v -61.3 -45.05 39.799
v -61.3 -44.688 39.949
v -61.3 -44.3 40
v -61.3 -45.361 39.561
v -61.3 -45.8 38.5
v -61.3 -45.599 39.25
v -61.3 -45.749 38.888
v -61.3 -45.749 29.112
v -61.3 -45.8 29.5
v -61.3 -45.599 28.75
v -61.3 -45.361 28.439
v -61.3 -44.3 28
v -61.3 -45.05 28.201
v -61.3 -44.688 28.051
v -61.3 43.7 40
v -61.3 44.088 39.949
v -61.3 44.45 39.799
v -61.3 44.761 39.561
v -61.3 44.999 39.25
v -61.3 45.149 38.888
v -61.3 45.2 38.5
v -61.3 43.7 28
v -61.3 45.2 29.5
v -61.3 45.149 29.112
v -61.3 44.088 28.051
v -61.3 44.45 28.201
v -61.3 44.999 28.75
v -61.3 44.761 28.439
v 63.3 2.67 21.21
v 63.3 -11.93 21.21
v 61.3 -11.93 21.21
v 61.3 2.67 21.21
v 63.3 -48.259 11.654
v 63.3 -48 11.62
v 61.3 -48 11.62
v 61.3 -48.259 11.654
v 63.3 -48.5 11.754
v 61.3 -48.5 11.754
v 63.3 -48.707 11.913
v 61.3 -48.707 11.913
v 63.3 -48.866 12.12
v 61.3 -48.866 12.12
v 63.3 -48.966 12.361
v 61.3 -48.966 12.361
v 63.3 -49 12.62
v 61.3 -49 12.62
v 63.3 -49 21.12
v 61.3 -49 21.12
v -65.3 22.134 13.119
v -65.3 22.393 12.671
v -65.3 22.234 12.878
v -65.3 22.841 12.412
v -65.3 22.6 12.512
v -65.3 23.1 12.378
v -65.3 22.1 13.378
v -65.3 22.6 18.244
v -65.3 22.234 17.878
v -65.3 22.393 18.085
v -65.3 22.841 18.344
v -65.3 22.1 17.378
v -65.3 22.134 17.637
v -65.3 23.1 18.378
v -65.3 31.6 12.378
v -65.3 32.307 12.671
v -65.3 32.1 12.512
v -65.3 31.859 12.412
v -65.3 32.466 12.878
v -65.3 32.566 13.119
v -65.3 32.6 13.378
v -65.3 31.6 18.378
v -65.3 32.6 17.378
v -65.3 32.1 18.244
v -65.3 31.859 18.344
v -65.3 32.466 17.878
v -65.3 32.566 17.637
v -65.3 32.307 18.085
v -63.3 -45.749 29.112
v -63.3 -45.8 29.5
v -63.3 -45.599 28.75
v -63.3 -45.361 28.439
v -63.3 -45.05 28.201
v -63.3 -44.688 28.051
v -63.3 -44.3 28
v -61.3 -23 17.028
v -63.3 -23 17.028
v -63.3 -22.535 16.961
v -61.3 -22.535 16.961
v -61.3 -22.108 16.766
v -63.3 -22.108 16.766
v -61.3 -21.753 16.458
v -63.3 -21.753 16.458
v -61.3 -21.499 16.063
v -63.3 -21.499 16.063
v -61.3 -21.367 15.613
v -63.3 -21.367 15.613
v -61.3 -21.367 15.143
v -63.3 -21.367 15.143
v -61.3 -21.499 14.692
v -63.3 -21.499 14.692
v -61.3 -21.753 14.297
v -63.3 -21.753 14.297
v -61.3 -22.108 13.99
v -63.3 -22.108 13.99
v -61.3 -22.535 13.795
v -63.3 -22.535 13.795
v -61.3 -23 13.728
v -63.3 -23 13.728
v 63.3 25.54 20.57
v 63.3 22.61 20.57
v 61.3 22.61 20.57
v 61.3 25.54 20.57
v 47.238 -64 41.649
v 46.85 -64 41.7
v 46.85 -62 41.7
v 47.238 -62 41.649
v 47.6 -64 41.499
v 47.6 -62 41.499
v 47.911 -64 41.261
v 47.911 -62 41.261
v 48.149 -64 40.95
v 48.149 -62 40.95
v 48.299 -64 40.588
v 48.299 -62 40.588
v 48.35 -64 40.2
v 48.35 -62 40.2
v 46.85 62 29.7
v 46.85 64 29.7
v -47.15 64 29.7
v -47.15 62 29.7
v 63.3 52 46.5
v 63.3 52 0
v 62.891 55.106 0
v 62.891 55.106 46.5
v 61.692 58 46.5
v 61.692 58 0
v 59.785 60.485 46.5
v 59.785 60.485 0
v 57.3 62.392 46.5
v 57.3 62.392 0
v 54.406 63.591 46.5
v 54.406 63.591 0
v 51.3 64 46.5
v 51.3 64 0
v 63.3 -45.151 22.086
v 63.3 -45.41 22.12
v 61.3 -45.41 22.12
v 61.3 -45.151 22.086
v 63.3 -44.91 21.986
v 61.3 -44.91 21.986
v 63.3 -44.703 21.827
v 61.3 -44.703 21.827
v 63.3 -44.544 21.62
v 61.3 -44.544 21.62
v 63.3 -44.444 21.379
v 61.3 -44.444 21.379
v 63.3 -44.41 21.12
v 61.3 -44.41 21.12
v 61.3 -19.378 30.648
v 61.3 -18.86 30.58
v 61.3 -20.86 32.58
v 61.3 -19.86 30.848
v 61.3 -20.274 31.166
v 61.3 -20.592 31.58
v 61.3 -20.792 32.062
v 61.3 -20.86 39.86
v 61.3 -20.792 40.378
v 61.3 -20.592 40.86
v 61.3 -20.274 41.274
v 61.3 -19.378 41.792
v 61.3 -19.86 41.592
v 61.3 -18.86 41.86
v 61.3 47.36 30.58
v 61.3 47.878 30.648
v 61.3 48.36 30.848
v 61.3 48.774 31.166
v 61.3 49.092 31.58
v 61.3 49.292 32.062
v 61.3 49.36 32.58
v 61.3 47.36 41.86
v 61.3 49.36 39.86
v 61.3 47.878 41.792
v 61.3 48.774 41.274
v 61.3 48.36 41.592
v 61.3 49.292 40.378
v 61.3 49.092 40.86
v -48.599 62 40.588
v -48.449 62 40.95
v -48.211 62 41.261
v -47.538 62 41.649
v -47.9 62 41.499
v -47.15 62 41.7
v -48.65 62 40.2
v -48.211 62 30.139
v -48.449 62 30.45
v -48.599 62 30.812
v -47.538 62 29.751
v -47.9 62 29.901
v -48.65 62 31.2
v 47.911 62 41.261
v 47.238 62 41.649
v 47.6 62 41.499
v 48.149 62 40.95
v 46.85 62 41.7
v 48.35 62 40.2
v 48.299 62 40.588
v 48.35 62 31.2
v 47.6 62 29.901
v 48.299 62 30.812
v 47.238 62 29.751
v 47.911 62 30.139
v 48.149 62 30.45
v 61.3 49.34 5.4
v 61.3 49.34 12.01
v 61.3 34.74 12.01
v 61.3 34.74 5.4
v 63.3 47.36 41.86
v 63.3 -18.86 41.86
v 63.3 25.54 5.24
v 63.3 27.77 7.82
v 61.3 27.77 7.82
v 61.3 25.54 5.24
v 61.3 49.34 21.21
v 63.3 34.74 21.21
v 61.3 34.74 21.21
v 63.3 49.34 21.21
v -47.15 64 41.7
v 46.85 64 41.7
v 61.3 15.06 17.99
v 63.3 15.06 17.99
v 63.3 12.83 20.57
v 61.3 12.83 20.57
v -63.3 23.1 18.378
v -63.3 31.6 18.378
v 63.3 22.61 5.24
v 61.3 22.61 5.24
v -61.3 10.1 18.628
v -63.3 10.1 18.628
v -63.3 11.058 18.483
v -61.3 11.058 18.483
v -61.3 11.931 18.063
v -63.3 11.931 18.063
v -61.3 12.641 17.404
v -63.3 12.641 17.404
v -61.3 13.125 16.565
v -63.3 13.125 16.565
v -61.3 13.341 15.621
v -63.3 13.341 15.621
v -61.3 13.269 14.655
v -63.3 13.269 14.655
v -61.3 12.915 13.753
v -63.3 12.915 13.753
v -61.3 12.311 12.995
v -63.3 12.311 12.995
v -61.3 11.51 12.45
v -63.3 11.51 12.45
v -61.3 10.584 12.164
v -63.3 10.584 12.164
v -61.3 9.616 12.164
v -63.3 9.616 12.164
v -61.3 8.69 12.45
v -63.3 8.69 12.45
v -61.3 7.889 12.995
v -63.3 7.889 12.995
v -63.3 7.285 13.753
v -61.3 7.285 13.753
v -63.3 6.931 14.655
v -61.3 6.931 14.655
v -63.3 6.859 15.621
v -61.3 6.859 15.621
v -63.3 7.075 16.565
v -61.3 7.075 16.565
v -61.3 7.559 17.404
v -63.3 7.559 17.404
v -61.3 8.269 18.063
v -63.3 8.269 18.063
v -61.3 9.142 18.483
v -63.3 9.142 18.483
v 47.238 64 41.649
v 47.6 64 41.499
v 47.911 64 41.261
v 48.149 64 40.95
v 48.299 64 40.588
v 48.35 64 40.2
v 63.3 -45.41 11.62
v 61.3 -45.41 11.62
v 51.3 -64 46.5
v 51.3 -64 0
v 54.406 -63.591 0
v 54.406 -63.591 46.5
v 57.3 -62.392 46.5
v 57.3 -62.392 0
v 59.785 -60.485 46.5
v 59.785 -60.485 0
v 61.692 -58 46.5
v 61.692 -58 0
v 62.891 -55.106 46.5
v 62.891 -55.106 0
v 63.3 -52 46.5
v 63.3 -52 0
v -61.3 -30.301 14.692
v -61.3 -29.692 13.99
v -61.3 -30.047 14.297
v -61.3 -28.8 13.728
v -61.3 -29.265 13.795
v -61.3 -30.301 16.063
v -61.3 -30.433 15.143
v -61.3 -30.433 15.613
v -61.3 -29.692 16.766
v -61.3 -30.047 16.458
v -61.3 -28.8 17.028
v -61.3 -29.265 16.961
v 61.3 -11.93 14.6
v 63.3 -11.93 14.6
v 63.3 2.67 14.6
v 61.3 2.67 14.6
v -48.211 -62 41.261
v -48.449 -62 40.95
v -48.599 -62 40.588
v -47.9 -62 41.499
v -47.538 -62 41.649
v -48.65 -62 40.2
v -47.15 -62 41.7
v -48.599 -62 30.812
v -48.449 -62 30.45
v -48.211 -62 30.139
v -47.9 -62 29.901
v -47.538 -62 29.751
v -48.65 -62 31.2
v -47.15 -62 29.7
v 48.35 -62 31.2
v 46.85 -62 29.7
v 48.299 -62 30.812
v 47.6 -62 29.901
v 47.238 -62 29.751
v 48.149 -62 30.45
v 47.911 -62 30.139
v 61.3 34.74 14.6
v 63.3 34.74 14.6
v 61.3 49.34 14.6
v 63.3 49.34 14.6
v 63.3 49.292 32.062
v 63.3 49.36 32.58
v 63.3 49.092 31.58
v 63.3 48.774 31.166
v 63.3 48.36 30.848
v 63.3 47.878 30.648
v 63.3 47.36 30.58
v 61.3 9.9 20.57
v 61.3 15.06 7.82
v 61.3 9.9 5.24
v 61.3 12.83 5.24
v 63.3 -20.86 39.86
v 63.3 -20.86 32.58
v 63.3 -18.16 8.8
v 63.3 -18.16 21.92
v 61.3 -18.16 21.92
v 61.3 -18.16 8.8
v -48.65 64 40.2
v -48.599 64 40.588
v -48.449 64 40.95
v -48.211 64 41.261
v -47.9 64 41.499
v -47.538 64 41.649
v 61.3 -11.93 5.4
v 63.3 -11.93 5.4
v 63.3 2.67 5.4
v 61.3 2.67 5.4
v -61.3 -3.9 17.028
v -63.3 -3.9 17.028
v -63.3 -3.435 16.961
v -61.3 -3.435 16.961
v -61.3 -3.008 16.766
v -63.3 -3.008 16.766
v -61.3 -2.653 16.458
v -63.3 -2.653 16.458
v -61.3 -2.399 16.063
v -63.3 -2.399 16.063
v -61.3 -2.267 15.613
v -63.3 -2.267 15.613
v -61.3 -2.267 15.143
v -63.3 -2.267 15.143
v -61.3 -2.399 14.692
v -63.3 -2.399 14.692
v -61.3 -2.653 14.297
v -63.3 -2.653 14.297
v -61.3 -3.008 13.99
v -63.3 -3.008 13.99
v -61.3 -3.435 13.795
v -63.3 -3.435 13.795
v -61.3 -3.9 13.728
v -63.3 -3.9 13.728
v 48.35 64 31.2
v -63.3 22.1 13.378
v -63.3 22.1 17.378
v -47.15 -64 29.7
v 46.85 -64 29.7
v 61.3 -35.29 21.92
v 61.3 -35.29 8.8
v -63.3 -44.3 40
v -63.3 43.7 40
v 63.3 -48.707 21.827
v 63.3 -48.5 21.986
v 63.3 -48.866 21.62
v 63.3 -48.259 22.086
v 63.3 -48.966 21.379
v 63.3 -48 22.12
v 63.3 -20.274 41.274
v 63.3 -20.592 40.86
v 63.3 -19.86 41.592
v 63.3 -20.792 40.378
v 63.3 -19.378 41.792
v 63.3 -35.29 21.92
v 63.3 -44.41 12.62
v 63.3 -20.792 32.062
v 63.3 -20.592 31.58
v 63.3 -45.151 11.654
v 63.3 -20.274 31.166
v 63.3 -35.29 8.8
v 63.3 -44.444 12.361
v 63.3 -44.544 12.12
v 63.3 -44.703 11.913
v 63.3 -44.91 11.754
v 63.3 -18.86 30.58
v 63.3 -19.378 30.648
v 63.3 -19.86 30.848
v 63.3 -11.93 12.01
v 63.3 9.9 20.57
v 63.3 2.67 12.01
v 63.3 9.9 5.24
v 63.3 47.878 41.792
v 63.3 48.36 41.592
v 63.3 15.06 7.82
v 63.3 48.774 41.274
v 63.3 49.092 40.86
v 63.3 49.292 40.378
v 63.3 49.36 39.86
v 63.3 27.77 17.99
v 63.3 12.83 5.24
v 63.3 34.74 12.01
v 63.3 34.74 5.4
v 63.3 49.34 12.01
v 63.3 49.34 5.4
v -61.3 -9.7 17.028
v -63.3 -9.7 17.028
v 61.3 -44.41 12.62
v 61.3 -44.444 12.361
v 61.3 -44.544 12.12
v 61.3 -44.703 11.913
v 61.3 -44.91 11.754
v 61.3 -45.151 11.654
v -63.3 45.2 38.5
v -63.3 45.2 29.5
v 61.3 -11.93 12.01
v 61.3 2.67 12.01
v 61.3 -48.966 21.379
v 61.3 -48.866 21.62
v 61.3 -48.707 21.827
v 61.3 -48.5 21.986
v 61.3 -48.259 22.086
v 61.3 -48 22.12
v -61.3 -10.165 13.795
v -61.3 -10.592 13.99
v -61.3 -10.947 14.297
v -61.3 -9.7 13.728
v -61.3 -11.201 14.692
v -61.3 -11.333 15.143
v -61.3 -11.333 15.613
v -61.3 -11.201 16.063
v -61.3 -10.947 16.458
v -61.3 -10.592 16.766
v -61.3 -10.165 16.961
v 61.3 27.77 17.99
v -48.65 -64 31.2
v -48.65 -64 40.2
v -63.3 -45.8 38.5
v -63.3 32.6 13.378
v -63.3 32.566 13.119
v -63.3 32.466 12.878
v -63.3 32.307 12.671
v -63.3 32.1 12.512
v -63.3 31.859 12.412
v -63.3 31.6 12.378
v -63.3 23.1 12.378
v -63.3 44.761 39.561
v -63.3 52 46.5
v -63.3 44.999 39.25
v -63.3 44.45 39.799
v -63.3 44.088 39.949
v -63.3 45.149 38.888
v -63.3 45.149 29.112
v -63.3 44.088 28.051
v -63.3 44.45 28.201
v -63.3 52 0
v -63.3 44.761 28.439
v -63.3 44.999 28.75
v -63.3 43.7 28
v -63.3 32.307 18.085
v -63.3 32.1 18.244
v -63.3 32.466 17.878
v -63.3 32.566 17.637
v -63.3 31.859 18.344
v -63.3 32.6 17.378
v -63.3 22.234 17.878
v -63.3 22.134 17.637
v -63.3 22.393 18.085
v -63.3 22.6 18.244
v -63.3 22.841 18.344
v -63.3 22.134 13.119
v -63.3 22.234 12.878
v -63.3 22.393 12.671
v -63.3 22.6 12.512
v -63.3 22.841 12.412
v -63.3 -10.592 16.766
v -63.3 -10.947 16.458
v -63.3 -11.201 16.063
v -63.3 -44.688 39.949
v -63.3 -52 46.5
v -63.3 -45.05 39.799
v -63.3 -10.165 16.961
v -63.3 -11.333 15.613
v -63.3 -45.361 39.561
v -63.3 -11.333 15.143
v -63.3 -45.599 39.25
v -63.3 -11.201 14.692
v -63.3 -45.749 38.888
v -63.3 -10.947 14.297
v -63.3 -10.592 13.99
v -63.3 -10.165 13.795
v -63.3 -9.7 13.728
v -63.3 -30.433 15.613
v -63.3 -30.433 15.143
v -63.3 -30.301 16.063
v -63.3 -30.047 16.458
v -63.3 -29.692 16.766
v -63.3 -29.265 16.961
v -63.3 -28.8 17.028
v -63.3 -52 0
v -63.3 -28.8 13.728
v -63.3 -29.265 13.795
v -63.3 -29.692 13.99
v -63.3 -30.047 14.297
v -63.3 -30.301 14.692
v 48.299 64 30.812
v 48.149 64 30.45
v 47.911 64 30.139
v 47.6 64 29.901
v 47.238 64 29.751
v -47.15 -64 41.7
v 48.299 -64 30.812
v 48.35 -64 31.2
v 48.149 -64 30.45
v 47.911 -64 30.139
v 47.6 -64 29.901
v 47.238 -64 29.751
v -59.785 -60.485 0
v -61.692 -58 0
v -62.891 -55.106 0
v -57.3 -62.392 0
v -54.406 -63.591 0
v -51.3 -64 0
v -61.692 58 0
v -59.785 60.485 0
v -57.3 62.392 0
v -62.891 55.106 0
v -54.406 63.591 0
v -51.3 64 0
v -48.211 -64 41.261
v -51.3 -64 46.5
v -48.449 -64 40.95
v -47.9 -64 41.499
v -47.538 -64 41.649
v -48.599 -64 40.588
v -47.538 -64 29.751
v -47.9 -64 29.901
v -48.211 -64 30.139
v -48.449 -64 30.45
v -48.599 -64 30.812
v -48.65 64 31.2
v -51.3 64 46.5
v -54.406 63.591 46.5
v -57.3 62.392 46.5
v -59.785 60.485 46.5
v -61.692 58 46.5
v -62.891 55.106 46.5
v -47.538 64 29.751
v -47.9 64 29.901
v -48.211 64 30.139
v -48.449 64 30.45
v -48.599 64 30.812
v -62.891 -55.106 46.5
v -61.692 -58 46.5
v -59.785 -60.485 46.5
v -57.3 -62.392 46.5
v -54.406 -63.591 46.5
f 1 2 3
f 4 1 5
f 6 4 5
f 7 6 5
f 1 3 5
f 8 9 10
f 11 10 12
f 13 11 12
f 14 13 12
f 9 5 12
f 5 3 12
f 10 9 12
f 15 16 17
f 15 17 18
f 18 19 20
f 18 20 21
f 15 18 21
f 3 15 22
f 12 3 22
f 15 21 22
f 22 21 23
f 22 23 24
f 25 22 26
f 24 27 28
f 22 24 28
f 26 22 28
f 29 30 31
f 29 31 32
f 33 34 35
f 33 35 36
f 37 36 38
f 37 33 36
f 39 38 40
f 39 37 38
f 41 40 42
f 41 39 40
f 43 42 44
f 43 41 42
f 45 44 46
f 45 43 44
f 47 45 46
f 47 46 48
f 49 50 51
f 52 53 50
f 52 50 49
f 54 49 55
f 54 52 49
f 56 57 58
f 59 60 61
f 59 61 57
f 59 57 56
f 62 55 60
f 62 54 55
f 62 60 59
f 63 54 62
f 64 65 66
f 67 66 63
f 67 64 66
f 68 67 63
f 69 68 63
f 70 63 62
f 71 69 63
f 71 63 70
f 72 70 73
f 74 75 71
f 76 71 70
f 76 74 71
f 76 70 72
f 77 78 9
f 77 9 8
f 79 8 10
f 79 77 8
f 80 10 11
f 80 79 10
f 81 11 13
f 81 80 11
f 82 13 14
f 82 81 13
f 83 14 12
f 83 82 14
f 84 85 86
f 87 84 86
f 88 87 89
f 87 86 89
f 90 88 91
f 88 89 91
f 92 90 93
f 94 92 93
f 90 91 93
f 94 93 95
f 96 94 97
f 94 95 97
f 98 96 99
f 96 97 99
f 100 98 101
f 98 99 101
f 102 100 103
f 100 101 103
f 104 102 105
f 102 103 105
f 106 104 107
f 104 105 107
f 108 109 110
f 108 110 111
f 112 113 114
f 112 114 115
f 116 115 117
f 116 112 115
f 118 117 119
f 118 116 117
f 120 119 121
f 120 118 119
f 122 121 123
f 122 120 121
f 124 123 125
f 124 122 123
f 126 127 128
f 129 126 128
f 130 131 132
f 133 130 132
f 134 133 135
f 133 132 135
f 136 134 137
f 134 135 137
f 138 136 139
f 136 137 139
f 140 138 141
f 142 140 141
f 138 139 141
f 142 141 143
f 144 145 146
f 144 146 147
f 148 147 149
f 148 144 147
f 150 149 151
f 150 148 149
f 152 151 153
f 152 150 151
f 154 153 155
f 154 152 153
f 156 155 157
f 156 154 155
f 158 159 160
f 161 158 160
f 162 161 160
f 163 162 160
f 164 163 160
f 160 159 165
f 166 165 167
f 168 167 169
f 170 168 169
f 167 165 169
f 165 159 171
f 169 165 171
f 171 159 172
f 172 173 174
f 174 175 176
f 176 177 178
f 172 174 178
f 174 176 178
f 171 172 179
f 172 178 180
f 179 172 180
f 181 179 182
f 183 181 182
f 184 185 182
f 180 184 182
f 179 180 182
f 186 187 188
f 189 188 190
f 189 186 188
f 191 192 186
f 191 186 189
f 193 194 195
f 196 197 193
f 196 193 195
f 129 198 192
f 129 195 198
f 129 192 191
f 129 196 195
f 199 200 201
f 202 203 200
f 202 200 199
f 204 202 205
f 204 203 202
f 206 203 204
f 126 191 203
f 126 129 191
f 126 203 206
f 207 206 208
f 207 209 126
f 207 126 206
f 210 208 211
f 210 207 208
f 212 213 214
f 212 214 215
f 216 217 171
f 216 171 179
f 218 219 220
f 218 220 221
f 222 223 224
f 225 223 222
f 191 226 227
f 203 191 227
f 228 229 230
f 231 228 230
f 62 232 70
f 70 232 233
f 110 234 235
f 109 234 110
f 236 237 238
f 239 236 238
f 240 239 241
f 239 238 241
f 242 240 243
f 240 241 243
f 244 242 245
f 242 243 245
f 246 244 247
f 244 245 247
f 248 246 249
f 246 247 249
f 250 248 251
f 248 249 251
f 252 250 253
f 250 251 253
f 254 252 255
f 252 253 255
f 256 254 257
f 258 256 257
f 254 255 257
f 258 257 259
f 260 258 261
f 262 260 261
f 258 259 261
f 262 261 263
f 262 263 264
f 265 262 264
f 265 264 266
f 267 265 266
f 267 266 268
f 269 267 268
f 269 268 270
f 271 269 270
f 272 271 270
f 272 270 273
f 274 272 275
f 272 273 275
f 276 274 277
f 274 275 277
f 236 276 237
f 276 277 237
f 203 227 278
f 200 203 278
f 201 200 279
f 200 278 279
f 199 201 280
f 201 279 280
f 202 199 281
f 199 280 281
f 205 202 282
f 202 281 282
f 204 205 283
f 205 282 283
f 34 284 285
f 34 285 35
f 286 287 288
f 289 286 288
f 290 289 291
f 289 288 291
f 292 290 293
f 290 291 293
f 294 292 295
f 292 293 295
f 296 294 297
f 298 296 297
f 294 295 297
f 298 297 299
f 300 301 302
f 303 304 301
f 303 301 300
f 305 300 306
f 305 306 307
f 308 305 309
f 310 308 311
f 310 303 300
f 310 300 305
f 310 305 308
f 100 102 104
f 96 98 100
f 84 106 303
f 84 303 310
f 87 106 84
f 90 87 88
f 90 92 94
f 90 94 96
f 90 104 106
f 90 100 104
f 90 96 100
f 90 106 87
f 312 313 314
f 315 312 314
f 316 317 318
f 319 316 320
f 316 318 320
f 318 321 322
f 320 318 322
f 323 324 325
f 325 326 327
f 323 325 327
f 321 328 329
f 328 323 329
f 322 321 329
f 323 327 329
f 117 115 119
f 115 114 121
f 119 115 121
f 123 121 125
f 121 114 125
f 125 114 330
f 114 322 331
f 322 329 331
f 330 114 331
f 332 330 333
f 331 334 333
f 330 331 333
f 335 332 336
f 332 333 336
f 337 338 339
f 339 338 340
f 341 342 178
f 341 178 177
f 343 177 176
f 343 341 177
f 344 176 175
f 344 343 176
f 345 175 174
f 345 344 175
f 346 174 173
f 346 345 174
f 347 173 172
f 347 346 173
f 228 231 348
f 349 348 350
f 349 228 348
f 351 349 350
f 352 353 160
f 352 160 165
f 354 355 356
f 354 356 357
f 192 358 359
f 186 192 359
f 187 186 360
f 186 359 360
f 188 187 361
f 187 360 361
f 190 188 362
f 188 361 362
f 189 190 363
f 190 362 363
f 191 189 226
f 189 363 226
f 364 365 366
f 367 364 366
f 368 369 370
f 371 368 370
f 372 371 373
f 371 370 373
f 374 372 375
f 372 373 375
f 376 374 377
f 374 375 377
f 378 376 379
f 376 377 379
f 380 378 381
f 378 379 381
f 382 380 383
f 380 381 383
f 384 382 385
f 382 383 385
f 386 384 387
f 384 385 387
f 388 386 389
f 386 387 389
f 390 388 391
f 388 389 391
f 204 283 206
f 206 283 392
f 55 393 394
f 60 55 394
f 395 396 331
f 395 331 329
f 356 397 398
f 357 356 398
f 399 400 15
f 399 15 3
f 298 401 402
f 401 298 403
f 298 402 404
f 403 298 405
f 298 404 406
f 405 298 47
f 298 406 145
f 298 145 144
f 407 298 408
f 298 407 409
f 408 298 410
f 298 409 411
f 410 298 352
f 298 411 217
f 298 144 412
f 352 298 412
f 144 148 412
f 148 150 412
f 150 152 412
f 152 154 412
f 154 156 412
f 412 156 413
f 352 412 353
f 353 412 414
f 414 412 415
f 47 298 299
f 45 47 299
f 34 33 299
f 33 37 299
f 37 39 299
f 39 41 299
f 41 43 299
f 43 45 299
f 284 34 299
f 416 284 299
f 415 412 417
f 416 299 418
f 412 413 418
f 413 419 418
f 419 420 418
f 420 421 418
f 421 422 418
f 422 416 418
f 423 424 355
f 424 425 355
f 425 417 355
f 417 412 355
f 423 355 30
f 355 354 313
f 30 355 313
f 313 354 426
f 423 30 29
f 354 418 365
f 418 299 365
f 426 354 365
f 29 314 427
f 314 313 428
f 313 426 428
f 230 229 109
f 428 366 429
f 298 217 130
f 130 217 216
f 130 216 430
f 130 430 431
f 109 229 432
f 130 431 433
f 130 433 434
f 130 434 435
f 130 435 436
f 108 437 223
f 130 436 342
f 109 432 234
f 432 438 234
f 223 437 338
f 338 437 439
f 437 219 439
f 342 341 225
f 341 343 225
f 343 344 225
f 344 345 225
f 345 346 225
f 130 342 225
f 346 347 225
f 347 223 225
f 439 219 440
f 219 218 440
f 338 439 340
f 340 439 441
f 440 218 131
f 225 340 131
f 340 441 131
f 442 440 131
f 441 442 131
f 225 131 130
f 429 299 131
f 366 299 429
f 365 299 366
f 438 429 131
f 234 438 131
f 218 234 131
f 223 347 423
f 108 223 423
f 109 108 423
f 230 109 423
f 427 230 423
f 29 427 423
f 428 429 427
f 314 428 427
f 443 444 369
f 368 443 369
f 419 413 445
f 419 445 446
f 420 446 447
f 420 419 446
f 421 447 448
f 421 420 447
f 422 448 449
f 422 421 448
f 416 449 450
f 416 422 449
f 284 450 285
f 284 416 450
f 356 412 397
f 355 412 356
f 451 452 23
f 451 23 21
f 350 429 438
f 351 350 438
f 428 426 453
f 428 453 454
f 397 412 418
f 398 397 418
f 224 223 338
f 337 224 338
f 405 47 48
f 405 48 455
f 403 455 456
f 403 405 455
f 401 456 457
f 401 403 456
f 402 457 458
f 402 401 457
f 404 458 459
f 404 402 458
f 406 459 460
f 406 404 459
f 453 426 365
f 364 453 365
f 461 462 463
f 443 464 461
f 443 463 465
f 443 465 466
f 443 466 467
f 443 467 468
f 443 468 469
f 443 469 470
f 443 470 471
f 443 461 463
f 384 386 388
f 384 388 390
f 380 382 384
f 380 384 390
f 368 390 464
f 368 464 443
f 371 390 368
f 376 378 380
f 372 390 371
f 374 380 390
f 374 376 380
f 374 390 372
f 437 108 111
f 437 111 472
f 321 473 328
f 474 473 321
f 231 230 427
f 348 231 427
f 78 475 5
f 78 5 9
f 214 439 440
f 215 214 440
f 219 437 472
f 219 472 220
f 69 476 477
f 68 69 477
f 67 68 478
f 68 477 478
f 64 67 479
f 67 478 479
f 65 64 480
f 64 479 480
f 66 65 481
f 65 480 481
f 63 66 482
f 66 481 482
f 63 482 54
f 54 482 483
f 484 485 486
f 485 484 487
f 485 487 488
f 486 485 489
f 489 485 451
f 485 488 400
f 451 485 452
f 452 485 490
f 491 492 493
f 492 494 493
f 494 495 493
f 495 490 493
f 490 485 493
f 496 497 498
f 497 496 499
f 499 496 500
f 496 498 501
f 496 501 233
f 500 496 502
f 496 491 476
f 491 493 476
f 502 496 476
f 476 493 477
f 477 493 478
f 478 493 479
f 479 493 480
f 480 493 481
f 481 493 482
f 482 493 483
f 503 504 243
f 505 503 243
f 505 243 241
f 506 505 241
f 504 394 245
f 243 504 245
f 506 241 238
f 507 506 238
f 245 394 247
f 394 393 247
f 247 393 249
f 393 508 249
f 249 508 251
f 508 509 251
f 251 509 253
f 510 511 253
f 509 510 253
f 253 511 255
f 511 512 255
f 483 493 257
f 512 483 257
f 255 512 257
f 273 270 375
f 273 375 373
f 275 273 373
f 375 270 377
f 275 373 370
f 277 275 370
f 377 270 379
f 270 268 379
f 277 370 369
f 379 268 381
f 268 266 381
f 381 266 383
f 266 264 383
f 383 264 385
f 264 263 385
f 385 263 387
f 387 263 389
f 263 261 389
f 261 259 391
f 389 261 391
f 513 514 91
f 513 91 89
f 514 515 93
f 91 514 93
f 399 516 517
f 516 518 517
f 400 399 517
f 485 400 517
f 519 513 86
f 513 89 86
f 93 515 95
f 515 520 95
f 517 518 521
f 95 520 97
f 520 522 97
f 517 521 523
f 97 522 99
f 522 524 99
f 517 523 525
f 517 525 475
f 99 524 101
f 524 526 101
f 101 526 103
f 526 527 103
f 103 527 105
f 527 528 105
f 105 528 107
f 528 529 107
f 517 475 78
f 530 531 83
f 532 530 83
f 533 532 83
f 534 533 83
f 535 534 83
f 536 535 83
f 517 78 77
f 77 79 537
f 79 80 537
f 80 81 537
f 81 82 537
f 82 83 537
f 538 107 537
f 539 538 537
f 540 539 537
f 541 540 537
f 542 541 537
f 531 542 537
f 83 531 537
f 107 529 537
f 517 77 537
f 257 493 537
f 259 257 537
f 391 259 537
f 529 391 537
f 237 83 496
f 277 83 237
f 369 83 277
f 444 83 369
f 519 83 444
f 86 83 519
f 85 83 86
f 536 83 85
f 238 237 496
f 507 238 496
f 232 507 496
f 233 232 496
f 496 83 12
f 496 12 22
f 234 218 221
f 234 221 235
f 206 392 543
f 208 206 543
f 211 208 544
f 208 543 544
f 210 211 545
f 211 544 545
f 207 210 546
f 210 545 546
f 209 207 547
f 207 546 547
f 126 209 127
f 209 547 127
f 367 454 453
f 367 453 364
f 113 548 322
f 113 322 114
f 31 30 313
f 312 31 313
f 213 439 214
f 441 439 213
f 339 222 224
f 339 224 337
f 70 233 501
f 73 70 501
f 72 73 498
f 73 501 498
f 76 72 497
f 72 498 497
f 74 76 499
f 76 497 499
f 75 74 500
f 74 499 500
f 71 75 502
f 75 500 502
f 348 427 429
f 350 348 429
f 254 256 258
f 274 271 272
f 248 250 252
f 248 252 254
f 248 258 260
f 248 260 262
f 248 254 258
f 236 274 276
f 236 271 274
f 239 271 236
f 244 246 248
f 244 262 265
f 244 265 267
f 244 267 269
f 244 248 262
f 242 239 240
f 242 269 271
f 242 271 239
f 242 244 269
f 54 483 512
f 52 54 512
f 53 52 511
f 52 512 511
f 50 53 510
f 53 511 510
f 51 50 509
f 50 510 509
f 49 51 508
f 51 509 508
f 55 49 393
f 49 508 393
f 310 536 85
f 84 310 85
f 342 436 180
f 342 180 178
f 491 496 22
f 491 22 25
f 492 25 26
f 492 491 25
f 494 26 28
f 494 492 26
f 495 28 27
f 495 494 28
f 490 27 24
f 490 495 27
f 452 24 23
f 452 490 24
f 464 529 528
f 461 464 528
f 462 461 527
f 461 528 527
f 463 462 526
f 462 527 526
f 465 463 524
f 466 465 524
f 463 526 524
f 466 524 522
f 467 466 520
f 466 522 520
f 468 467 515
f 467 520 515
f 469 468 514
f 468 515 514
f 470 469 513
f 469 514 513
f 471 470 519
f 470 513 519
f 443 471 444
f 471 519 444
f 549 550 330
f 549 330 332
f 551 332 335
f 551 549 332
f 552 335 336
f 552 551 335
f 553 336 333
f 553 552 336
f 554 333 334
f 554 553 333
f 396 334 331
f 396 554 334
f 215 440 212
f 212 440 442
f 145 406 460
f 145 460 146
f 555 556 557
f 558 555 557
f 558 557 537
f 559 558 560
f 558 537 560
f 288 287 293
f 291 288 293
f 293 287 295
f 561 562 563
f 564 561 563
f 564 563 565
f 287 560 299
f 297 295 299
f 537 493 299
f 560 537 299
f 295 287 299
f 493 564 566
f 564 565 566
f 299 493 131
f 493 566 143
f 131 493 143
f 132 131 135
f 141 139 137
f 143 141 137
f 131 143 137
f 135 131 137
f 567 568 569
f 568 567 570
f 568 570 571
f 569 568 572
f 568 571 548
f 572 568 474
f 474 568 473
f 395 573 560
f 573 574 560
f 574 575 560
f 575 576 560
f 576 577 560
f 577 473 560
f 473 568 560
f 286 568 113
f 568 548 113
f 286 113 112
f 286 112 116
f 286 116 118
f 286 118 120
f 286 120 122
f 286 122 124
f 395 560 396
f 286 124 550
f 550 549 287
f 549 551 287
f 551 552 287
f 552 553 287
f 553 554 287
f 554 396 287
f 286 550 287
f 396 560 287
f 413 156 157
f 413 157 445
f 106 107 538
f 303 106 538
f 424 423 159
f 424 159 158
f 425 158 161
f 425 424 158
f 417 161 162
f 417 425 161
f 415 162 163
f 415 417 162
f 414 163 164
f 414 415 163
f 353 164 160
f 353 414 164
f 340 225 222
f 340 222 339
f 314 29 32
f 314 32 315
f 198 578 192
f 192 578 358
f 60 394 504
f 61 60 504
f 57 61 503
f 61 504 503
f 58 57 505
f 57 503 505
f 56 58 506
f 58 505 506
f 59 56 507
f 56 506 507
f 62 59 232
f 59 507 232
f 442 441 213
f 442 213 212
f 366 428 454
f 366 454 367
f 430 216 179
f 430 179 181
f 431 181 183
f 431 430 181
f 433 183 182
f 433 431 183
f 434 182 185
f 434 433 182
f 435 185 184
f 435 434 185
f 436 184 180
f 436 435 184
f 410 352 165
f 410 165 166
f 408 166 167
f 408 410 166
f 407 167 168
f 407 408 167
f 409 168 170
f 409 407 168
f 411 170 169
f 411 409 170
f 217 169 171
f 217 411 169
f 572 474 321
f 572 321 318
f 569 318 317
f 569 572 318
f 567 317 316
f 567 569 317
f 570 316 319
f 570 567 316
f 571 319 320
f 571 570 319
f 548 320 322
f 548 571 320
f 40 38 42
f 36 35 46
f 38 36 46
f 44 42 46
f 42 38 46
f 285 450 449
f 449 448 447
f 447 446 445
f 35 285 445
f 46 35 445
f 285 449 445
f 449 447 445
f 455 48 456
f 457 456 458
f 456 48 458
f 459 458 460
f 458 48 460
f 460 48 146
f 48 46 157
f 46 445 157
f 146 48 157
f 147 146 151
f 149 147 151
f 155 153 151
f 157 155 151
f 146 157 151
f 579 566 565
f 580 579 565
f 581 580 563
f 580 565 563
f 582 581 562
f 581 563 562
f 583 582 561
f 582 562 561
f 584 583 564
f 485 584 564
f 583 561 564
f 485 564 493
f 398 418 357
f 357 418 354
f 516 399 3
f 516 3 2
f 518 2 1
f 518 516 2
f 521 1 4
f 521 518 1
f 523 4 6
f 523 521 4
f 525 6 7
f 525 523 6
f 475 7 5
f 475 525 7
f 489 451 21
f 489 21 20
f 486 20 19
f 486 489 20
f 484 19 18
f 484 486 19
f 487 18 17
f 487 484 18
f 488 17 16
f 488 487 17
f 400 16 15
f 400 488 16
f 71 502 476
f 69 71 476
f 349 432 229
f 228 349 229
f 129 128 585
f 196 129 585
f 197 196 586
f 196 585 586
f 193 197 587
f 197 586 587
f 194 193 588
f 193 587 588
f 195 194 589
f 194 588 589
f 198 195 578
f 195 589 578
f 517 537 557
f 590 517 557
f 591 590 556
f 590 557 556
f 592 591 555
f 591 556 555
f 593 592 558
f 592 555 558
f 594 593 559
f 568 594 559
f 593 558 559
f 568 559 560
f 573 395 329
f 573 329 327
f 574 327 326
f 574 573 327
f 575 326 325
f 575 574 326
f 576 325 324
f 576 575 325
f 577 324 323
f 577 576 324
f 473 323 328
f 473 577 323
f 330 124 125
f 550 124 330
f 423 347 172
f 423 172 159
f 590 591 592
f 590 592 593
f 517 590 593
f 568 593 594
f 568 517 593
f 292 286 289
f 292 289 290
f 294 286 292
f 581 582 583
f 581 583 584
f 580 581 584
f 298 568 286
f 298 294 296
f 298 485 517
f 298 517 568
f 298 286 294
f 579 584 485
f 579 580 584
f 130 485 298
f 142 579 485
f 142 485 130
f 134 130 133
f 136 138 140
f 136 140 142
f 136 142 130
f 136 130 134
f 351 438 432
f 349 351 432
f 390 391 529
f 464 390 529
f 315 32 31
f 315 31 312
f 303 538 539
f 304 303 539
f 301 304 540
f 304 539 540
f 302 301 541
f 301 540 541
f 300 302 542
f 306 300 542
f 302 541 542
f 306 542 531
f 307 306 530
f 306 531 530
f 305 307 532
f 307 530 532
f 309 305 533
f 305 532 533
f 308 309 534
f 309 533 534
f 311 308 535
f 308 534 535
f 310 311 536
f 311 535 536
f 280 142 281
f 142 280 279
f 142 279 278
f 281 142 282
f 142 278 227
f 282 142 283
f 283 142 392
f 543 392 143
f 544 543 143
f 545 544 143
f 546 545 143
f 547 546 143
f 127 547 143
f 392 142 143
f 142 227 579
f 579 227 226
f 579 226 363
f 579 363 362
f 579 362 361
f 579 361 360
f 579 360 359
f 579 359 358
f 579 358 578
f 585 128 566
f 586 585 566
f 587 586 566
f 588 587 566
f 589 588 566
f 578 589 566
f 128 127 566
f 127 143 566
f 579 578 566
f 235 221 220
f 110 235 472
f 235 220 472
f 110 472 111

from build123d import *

# Parameters (mm, degrees)
DODANIE_WYCI_GNI_CIE1_DEPTH = 46.5
WYTNIJ_WYCI_GNI_CIE1_DEPTH  = 2
SZKIC3_R                    = 3.25
WYTNIJ_WYCI_GNI_CIE2_DEPTH  = 2
DODANIE_WYCI_GNI_CIE2_DEPTH = 2
SZKIC5_W                    = 6.61
SZKIC5_H                    = 14.6
SZKIC5_W_2                  = 13.12
SZKIC5_H_2                  = 17.13
WYTNIJ_WYCI_GNI_CIE3_DEPTH  = 2


with BuildPart() as part:
    # Szkic1 → Dodanie-wyciągnięcie1 (new body)
    with BuildSketch(Plane.XY):
        with BuildLine():
            Line((-51.3, -64), (51.3, -64))
            ThreePointArc((51.3, -64), (59.785281374, -60.485281374), (63.3, -52))
            Line((63.3, -52), (63.3, 52))
            ThreePointArc((63.3, 52), (59.785281374, 60.485281374), (51.3, 64))
            Line((51.3, 64), (-51.3, 64))
            ThreePointArc((-51.3, 64), (-59.785281374, 60.485281374), (-63.3, 52))
            Line((-63.3, 52), (-63.3, -52))
            ThreePointArc((-63.3, -52), (-59.785281374, -60.485281374), (-51.3, -64))
        make_face()
    extrude(amount=DODANIE_WYCI_GNI_CIE1_DEPTH)

    # Szkic2 → Wytnij-wyciągnięcie1 (cut)
    with BuildSketch(Plane(origin=(0, 64, 0), x_dir=(1, 0, 0), z_dir=(0, 1, 0))):
        with BuildLine():
            Line((-48.65, -31.2), (-48.65, -40.2))
            ThreePointArc((-48.65, -40.2), (-48.210660172, -41.260660172), (-47.15, -41.7))
            Line((-47.15, -41.7), (46.85, -41.7))
            ThreePointArc((46.85, -41.7), (47.910660172, -41.260660172), (48.35, -40.2))
            Line((48.35, -40.2), (48.35, -31.2))
            ThreePointArc((48.35, -31.2), (47.910660172, -30.139339828), (46.85, -29.7))
            Line((46.85, -29.7), (-47.15, -29.7))
            ThreePointArc((-47.15, -29.7), (-48.210660172, -30.139339828), (-48.65, -31.2))
        make_face()
    wytnij_wyci_gni_cie1 = extrude(amount=-WYTNIJ_WYCI_GNI_CIE1_DEPTH, mode=Mode.SUBTRACT)

    # Szkic3 → Wytnij-wyciągnięcie2 (cut)
    with BuildSketch(Plane.ZY.offset(63.3)):
        with BuildLine():
            ThreePointArc((28, -44.3), (28.439339828, -45.360660172), (29.5, -45.8))
            Line((29.5, -45.8), (38.5, -45.8))
            ThreePointArc((38.5, -45.8), (39.560660172, -45.360660172), (40, -44.3))
            Line((40, -44.3), (40, 43.7))
            ThreePointArc((40, 43.7), (39.560660172, 44.760660172), (38.5, 45.2))
            Line((38.5, 45.2), (29.5, 45.2))
            ThreePointArc((29.5, 45.2), (28.439339828, 44.760660172), (28, 43.7))
            Line((28, 43.7), (28, -44.3))
        make_face()
        with BuildLine():
            Line((17.02769909, -28.8), (17.02769909, -23))
            ThreePointArc((17.02769909, -23), (15.37769909, -21.35), (13.72769909, -23))
            Line((13.72769909, -23), (13.72769909, -28.8))
            ThreePointArc((13.72769909, -28.8), (15.37769909, -30.45), (17.02769909, -28.8))
        make_face()
        with BuildLine():
            Line((17.02769909, -9.7), (17.02769909, -3.9))
            ThreePointArc((17.02769909, -3.9), (15.37769909, -2.25), (13.72769909, -3.9))
            Line((13.72769909, -3.9), (13.72769909, -9.7))
            ThreePointArc((13.72769909, -9.7), (15.37769909, -11.35), (17.02769909, -9.7))
        make_face()
        with Locations((15.37769909, 10.1)):
            Circle(SZKIC3_R)
    extrude(amount=-WYTNIJ_WYCI_GNI_CIE2_DEPTH, mode=Mode.SUBTRACT)

    # Szkic3<3> → Dodanie-wyciągnięcie2 (add)
    with BuildSketch(Plane.ZY.offset(63.3)):
        with BuildLine():
            Line((17.37769909, 32.6), (13.37769909, 32.6))
            ThreePointArc((13.37769909, 32.6), (12.670592309, 32.307106781), (12.37769909, 31.6))
            Line((12.37769909, 31.6), (12.37769909, 23.1))
            ThreePointArc((12.37769909, 23.1), (12.670592309, 22.392893219), (13.37769909, 22.1))
            Line((13.37769909, 22.1), (17.37769909, 22.1))
            ThreePointArc((17.37769909, 22.1), (18.084805871, 22.392893219), (18.37769909, 23.1))
            Line((18.37769909, 23.1), (18.37769909, 31.6))
            ThreePointArc((18.37769909, 31.6), (18.084805871, 32.307106781), (17.37769909, 32.6))
        make_face()
    extrude(amount=DODANIE_WYCI_GNI_CIE2_DEPTH)

    # Lustro1: Wytnij-wyciągnięcie1 across plane
    add(wytnij_wyci_gni_cie1.mirror(Plane.ZX), mode=Mode.SUBTRACT)

    # Szkic5 → Wytnij-wyciągnięcie3 (cut)
    with BuildSketch(Plane(origin=(63.3, 0, 0), x_dir=(0, 0, -1), z_dir=(1, 0, 0))):
        with BuildLine():
            Line((-39.86, 49.36), (-32.58, 49.36))
            ThreePointArc((-32.58, 49.36), (-31.165786438, 48.774213562), (-30.58, 47.36))
            Line((-30.58, 47.36), (-30.58, -18.86))
            ThreePointArc((-30.58, -18.86), (-31.165786438, -20.274213562), (-32.58, -20.86))
            Line((-32.58, -20.86), (-39.86, -20.86))
            ThreePointArc((-39.86, -20.86), (-41.274213562, -20.274213562), (-41.86, -18.86))
            Line((-41.86, -18.86), (-41.86, 47.36))
            ThreePointArc((-41.86, 47.36), (-41.274213562, 48.774213562), (-39.86, 49.36))
        make_face()
        with BuildLine():
            Line((-21.12, -44.41), (-12.62, -44.41))
            ThreePointArc((-12.62, -44.41), (-11.912893219, -44.702893219), (-11.62, -45.41))
            Line((-11.62, -45.41), (-11.62, -48))
            ThreePointArc((-11.62, -48), (-11.912893219, -48.707106781), (-12.62, -49))
            Line((-12.62, -49), (-21.12, -49))
            ThreePointArc((-21.12, -49), (-21.827106781, -48.707106781), (-22.12, -48))
            Line((-22.12, -48), (-22.12, -45.41))
            ThreePointArc((-22.12, -45.41), (-21.827106781, -44.702893219), (-21.12, -44.41))
        make_face()
        with Locations((-8.705, -4.63)):
            Rectangle(SZKIC5_W, SZKIC5_H)
        with Locations((-15.36, -26.725)):
            Rectangle(SZKIC5_W_2, SZKIC5_H_2)
        with Locations((-17.905, -4.63)):
            Rectangle(SZKIC5_W, SZKIC5_H)
        Polygon((-20.57, 9.9), (-5.24, 9.9), (-5.24, 12.83), (-7.82, 15.06), (-17.99, 15.06), (-20.57, 12.83), align=None)
        Polygon((-7.82, 27.77), (-5.24, 25.54), (-5.24, 22.61), (-20.57, 22.61), (-20.57, 25.54), (-17.99, 27.77), align=None)
        with Locations((-17.905, 42.04)):
            Rectangle(SZKIC5_W, SZKIC5_H)
        with Locations((-8.705, 42.04)):
            Rectangle(SZKIC5_W, SZKIC5_H)
    extrude(amount=-WYTNIJ_WYCI_GNI_CIE3_DEPTH, mode=Mode.SUBTRACT)


solid = part.part
